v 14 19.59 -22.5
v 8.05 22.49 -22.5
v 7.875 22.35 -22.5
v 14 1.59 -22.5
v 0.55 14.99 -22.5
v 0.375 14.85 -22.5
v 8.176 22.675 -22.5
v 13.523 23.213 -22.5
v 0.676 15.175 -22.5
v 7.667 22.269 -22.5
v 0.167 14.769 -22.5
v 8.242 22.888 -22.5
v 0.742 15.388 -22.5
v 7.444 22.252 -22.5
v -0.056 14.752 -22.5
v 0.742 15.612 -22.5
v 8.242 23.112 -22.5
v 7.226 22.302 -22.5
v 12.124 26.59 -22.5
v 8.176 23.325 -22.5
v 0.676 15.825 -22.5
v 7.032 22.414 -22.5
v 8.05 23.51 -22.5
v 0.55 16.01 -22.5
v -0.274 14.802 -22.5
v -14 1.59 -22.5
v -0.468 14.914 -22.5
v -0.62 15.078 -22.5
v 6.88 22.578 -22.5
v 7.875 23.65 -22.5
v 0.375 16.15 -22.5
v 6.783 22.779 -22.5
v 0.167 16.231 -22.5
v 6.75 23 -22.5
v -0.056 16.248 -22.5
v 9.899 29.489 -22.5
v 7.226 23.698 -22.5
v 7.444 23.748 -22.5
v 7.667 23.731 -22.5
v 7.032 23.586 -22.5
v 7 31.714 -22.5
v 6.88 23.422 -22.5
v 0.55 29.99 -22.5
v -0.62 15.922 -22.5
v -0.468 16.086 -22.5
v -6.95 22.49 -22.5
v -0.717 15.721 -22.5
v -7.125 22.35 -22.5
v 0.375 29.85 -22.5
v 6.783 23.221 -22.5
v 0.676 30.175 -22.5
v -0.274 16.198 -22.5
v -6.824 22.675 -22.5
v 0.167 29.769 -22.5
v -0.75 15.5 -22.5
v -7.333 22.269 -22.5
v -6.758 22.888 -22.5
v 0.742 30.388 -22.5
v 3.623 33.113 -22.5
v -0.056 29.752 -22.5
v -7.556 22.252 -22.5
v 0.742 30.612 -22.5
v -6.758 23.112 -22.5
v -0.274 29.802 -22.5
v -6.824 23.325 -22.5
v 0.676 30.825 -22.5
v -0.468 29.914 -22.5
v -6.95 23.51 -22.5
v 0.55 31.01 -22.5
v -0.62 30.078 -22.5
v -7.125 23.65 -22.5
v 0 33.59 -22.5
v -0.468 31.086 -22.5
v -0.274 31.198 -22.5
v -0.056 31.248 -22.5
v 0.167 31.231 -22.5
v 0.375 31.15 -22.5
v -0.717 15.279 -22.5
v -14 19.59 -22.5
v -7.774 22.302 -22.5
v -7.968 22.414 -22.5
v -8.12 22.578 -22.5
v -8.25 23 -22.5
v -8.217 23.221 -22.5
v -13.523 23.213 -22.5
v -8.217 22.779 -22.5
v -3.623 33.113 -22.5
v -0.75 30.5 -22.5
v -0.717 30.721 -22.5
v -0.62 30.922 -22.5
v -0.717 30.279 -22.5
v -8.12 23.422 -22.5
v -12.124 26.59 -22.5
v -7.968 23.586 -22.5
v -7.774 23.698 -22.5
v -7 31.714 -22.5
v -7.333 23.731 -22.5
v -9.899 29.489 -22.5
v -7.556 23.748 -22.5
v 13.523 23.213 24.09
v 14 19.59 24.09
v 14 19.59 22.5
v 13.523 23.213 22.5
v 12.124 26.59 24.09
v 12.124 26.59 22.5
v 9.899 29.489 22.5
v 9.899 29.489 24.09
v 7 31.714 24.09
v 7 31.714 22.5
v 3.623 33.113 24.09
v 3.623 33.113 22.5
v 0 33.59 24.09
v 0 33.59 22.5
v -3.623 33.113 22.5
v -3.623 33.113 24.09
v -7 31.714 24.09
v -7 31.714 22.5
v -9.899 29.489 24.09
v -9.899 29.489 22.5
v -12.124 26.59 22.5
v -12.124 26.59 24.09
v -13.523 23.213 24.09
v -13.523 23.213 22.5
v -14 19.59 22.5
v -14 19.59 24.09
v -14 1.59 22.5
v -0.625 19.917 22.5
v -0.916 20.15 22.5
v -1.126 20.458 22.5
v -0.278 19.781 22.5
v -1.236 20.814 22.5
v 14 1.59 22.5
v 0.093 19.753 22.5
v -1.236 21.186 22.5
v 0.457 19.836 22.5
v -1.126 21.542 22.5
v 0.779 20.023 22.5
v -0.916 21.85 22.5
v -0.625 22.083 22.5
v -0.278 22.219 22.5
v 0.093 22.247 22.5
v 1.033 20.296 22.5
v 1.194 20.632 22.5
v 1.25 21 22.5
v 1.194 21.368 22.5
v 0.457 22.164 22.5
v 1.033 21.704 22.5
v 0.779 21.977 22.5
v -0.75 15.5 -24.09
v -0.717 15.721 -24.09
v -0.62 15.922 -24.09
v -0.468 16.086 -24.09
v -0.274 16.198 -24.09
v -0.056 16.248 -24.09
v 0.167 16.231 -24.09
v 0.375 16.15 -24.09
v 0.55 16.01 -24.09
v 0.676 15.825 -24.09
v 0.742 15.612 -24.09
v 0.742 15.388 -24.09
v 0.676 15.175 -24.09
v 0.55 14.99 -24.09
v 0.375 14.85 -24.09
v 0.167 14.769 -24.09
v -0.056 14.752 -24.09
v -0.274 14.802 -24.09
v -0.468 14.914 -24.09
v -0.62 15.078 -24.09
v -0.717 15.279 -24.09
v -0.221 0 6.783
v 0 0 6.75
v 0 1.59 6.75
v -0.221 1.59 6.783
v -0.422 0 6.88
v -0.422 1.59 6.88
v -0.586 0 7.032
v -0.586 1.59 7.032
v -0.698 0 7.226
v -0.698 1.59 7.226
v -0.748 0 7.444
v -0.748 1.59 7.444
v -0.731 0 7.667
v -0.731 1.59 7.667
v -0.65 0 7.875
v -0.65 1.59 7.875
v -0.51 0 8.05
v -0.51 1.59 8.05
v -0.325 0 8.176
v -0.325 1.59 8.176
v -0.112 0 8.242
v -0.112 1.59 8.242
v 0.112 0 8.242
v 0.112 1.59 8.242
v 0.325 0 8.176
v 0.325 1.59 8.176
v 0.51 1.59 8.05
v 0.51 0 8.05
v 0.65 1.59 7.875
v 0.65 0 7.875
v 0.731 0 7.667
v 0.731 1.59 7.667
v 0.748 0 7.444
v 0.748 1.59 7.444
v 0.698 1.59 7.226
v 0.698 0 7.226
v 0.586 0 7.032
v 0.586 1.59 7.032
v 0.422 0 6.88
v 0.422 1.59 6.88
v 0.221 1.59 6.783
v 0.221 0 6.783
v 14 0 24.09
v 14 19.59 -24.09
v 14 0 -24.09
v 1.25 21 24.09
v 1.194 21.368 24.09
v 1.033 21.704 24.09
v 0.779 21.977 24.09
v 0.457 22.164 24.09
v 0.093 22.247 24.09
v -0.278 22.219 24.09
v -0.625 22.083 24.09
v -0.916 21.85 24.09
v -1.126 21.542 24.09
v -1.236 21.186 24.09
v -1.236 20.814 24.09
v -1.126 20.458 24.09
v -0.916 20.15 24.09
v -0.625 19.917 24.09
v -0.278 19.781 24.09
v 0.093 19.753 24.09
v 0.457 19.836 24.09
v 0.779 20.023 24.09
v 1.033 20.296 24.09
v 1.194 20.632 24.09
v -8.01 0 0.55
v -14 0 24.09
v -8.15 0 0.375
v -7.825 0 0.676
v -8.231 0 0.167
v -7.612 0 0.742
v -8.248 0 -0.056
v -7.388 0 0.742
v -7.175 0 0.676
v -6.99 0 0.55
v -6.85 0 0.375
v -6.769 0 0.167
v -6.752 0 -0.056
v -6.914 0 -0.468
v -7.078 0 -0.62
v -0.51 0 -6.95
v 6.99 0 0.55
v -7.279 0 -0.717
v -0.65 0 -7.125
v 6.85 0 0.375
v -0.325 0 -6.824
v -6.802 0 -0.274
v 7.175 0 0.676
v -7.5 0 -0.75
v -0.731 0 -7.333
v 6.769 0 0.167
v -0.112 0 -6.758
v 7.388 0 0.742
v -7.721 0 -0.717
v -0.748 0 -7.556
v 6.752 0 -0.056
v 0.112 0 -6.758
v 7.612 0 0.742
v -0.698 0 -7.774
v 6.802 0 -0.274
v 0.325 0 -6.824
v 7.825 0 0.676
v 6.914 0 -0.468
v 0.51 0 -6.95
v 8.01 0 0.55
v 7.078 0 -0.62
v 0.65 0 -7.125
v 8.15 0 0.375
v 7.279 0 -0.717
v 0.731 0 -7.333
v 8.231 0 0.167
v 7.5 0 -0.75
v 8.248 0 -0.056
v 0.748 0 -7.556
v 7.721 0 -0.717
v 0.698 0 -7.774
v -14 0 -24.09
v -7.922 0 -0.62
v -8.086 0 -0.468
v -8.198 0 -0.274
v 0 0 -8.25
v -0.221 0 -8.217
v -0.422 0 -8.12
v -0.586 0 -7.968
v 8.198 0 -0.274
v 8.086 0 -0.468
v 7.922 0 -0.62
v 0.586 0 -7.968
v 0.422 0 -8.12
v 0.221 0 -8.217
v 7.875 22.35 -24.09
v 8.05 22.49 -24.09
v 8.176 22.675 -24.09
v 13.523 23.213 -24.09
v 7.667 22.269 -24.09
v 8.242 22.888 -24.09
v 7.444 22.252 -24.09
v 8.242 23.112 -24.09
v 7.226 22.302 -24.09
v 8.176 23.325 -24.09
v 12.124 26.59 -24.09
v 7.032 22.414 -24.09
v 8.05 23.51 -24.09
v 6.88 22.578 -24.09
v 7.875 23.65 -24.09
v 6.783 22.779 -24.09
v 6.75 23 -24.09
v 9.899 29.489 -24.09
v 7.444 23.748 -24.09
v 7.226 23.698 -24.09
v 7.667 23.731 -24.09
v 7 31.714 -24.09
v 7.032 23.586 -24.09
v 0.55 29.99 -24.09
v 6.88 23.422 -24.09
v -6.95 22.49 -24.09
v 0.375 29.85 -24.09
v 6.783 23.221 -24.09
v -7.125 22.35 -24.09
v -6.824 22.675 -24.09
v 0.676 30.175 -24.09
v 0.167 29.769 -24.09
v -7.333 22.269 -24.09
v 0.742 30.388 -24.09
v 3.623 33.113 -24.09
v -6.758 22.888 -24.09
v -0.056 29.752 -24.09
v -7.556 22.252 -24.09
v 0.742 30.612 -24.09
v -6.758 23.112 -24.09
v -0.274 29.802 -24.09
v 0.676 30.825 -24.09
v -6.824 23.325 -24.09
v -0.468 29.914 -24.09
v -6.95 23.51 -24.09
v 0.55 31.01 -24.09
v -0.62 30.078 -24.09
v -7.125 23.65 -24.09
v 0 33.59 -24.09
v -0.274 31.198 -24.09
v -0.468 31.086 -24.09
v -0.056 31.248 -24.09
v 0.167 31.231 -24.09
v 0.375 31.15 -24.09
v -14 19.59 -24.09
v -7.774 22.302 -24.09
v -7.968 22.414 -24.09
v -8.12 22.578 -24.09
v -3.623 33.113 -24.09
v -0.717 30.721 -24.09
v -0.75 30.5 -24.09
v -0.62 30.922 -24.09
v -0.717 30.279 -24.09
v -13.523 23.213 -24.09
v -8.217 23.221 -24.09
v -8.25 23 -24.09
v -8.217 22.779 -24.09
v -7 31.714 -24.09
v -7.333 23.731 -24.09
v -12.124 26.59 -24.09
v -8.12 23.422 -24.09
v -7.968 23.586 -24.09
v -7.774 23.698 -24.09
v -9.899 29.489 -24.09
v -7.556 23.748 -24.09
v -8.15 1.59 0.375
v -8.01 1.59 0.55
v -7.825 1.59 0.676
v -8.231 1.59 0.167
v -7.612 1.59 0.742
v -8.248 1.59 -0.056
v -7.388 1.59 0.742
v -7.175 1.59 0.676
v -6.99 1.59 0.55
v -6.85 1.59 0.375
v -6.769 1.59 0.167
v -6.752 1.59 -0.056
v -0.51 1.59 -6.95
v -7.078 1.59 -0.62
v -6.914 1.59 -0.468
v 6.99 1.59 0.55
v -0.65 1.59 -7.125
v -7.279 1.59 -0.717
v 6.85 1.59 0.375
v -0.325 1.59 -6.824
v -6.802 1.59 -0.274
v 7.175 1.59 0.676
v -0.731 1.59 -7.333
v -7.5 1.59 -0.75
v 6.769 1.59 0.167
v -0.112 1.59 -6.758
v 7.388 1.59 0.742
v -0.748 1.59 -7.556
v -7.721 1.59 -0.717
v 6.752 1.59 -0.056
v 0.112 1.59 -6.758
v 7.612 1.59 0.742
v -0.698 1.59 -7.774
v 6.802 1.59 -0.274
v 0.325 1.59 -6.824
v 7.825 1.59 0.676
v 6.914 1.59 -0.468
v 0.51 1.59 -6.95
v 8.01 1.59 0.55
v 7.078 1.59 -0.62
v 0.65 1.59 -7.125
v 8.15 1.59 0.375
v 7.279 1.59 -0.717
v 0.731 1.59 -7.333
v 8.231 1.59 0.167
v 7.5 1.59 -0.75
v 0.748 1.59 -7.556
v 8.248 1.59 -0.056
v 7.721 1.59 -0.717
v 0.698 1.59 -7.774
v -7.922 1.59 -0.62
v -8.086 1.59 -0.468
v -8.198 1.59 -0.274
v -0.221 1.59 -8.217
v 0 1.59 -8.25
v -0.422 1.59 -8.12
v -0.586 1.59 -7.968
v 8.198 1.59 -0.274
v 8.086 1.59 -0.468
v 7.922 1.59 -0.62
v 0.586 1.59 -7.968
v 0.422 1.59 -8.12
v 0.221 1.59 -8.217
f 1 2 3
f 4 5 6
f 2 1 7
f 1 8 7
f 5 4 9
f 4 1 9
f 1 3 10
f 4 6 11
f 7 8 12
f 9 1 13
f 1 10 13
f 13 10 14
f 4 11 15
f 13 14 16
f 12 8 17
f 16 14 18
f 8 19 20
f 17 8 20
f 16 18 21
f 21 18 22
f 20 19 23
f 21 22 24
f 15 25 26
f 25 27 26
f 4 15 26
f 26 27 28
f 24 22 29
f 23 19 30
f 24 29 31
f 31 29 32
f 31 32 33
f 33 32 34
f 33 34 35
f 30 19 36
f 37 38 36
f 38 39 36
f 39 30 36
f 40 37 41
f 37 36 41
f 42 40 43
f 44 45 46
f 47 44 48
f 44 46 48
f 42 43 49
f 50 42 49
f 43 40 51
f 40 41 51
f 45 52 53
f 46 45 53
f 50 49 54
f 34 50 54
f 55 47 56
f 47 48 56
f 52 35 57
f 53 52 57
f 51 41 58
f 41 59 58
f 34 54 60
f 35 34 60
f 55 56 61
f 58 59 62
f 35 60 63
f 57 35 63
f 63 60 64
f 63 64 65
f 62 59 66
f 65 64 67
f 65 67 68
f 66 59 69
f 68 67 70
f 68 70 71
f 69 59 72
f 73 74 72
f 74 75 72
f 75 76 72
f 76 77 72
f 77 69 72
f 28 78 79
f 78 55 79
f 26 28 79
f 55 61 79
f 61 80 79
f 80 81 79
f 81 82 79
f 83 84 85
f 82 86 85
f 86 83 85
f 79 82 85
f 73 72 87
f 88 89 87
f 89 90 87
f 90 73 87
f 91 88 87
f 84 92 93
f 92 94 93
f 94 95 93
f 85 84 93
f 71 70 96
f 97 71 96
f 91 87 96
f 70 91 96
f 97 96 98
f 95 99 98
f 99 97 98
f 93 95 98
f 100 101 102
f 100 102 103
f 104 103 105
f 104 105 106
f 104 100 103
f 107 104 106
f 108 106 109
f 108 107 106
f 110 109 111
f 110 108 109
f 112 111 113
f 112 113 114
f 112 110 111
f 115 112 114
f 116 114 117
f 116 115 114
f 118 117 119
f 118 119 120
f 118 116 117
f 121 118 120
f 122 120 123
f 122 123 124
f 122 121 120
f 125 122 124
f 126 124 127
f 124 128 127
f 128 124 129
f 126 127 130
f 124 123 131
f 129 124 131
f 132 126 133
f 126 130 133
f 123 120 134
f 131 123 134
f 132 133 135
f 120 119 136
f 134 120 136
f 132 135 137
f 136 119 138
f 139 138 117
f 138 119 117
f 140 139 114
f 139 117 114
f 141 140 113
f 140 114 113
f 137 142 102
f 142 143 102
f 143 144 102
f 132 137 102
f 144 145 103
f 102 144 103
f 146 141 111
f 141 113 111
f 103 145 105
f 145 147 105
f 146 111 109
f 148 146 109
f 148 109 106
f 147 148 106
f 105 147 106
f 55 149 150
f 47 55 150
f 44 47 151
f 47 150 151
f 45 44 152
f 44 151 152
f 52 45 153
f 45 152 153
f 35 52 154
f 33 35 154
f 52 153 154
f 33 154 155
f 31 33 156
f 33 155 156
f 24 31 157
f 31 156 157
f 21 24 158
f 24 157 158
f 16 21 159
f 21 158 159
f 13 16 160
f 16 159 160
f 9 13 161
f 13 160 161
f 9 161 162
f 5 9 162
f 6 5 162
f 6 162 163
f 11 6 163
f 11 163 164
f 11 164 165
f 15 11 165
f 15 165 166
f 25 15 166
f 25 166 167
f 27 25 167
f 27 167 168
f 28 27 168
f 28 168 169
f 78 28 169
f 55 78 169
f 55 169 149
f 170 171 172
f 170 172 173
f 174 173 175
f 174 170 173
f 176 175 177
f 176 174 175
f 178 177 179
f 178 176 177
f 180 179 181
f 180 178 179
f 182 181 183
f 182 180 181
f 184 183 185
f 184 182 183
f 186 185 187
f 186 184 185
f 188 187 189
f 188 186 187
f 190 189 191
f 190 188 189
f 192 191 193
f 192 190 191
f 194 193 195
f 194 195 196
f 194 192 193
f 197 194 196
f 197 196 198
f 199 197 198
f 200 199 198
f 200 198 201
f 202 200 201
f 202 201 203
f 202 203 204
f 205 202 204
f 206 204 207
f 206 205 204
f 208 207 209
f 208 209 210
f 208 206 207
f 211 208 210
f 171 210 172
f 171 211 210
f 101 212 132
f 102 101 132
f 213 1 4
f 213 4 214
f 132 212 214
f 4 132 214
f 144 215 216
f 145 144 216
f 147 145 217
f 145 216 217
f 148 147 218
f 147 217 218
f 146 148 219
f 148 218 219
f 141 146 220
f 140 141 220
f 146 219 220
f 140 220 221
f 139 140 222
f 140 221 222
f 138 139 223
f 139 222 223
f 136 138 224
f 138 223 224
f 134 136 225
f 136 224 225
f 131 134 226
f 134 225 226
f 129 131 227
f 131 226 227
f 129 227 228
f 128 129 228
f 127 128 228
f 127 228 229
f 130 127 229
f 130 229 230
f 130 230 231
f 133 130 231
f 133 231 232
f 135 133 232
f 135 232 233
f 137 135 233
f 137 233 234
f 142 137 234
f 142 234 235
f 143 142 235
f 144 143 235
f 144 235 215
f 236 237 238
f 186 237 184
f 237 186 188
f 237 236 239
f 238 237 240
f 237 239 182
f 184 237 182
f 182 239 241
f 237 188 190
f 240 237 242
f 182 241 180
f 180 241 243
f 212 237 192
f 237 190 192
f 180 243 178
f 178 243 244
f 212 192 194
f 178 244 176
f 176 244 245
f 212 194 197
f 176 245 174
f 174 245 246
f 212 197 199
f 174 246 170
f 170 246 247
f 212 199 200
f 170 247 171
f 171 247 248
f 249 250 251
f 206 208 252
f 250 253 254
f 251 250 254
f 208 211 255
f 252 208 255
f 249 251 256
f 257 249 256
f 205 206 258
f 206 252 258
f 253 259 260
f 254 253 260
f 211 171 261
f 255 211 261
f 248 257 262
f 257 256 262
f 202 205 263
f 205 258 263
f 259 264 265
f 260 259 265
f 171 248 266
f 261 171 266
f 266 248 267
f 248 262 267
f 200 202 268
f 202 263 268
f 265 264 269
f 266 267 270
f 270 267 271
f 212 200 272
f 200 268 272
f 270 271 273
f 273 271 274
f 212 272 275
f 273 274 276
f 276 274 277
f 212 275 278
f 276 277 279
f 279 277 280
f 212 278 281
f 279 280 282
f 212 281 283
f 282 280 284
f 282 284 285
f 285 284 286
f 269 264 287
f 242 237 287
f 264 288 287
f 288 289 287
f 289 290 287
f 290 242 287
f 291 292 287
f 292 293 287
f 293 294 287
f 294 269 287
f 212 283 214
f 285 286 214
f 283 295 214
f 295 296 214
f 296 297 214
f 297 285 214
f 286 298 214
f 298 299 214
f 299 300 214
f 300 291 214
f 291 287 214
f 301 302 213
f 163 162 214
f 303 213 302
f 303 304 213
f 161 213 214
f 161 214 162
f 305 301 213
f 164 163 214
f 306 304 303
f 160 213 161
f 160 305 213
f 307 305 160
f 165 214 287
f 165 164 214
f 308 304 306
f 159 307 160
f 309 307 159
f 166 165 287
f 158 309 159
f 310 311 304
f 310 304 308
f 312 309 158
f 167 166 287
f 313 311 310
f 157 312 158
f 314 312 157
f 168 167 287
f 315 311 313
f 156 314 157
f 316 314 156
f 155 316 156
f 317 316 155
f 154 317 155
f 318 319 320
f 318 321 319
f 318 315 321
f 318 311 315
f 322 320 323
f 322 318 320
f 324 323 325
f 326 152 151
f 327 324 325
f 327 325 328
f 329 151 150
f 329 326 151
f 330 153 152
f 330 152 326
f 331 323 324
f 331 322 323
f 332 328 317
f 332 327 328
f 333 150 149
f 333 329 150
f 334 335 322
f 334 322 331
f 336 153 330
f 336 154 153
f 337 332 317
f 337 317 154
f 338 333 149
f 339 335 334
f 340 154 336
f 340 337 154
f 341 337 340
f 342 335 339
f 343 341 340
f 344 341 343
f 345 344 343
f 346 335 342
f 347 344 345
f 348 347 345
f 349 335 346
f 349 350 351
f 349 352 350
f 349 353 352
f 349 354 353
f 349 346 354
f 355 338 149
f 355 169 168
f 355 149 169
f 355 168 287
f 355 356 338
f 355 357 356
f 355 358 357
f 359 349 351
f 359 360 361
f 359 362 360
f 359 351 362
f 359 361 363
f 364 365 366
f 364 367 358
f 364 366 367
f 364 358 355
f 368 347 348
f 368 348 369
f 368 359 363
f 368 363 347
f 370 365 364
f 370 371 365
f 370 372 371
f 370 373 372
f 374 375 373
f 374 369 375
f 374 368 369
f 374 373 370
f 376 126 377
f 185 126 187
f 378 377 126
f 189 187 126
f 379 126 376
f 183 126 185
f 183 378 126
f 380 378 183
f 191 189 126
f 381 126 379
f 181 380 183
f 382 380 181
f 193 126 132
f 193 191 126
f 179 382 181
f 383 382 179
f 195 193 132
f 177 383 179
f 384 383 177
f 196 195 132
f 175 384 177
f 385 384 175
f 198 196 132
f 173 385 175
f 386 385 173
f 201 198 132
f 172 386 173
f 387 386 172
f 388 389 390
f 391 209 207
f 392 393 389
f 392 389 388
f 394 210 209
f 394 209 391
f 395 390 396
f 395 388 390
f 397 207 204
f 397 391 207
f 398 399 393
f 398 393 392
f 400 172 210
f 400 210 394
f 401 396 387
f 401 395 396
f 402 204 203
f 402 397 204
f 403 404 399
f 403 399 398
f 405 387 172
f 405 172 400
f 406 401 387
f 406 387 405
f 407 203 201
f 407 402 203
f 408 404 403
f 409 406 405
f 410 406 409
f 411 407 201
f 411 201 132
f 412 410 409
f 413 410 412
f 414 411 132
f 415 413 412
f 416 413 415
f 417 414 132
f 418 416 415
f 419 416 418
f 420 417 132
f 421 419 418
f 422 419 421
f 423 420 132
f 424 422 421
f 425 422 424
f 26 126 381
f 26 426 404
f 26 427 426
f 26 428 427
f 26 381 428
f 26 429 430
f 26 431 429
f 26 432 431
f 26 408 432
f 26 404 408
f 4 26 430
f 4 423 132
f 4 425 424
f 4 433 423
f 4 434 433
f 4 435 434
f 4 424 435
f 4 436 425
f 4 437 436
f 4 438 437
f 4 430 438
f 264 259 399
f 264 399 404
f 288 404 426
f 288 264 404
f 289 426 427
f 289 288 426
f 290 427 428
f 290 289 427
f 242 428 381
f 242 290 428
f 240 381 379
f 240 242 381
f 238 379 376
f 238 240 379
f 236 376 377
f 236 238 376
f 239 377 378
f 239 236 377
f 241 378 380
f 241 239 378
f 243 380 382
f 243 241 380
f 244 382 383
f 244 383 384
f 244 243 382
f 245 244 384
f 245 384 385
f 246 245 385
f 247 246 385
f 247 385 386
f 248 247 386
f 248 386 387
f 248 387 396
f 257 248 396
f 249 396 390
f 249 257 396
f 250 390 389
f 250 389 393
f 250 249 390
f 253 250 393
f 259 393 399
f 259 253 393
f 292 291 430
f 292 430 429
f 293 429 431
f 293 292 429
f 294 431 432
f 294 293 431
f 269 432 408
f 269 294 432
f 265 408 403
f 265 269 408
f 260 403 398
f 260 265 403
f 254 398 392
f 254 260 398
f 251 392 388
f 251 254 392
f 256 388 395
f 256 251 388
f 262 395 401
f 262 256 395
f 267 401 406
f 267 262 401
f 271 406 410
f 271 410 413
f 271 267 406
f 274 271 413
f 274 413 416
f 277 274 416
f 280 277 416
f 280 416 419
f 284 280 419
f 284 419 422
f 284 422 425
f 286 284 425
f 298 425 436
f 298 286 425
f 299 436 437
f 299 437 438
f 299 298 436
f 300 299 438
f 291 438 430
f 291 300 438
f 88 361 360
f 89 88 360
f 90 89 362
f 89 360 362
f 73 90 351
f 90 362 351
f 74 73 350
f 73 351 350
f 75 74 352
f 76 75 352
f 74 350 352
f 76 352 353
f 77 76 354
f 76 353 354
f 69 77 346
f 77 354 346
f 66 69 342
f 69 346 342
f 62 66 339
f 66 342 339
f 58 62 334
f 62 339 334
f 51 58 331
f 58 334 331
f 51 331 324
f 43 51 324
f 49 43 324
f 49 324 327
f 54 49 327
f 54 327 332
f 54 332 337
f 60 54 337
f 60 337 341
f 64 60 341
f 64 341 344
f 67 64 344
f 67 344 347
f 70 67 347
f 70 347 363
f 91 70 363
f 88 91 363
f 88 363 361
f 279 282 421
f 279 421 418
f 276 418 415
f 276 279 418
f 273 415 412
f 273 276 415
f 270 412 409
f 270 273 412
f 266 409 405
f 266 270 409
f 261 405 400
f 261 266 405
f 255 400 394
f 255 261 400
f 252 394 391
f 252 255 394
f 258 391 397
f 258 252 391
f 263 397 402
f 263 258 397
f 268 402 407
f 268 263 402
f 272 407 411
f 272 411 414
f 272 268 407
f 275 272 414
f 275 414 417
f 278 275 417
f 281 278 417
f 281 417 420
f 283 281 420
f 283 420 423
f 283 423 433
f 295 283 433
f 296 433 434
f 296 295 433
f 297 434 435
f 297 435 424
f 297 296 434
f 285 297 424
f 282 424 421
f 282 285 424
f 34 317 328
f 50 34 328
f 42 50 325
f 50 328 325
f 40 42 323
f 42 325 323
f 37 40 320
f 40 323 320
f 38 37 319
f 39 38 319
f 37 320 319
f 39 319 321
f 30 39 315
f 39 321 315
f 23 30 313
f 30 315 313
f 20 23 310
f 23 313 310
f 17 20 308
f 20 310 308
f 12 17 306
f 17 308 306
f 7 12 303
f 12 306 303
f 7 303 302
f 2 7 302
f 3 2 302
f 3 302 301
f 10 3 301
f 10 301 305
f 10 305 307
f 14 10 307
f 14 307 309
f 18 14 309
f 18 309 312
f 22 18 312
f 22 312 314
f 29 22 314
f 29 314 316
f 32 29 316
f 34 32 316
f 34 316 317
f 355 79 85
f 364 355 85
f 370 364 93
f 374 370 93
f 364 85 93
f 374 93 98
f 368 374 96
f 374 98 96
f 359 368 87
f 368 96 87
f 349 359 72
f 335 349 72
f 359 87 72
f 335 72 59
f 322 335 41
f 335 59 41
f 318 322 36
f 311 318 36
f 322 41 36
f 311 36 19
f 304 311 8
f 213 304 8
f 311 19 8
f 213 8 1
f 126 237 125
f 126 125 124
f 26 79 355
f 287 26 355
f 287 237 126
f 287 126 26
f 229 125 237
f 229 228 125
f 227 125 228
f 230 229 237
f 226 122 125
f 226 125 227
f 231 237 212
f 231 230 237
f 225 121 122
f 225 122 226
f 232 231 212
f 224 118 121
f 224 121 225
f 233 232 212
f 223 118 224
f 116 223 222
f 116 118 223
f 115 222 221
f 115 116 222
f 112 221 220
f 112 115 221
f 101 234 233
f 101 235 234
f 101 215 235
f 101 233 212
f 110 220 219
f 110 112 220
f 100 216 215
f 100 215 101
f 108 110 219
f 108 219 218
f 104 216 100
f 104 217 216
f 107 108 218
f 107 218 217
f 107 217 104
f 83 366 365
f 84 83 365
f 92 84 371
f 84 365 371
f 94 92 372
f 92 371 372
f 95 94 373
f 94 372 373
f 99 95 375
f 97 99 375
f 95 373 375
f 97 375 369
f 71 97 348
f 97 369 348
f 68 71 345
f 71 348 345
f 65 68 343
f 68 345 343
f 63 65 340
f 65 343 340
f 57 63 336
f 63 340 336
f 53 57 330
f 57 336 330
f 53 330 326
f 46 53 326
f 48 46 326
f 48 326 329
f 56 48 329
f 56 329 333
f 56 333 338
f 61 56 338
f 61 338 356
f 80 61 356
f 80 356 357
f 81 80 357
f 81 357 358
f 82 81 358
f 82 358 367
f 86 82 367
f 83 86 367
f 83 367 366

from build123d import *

# Parameters (mm, degrees)
SKETCH1_W           = 28
SKETCH1_H           = 48.18
SKETCH1_R           = 0.75
BOSS_EXTRUDE1_DEPTH = 1.59
SKETCH2_W           = 28
SKETCH2_H           = 1.59
BOSS_EXTRUDE2_DEPTH = 18
BOSS_EXTRUDE3_DEPTH = 1.59
BOSS_EXTRUDE4_START = -1.59
BOSS_EXTRUDE4_DEPTH = 1.59
SKETCH5_R           = 1.25
CUT_EXTRUDE1_DEPTH  = 6
SKETCH6_R           = 0.75
CUT_EXTRUDE2_DEPTH  = 6


with BuildPart() as part:
    # Sketch1 → Boss-Extrude1 (new body)
    with BuildSketch(Plane(origin=(0, 0, 0), x_dir=(1, 0, 0), z_dir=(0, 1, 0))):
        Rectangle(SKETCH1_W, SKETCH1_H)
        with Locations(Location((0, 7.5, 0), (0, 0, 90))):
            Circle(SKETCH1_R, mode=Mode.SUBTRACT)
        with Locations(Location((0, -7.5, 0), (0, 0, 90))):
            Circle(SKETCH1_R, mode=Mode.SUBTRACT)
        with Locations(Location((7.5, 0, 0), (0, 0, 90))):
            Circle(SKETCH1_R, mode=Mode.SUBTRACT)
        with Locations(Location((-7.5, 0, 0), (0, 0, 90))):
            Circle(SKETCH1_R, mode=Mode.SUBTRACT)
    extrude(amount=BOSS_EXTRUDE1_DEPTH)

    # Sketch2 → Boss-Extrude2 (add)
    with BuildSketch(Plane(origin=(0, 1.59, 0), x_dir=(1, 0, 0), z_dir=(0, 1, 0))):
        with Locations((0, 23.295)):
            Rectangle(SKETCH2_W, SKETCH2_H)
        with Locations((0, -23.295)):
            Rectangle(SKETCH2_W, SKETCH2_H)
    extrude(amount=BOSS_EXTRUDE2_DEPTH)

    # Sketch3 → Boss-Extrude3 (add)
    with BuildSketch(Plane.XY.offset(24.09)):
        with BuildLine():
            Line((-14, 19.59), (14, 19.59))
            ThreePointArc((14, 19.59), (0, 33.59), (-14, 19.59))
        make_face()
    extrude(amount=-BOSS_EXTRUDE3_DEPTH)

    # Sketch4 → Boss-Extrude4 (add)
    with BuildSketch(Plane(origin=(0, 0, -24.09), x_dir=(-1, 0, 0), z_dir=(0, 0, -1)).offset(BOSS_EXTRUDE4_START)):
        with BuildLine():
            Line((-14, 19.59), (14, 19.59))
            ThreePointArc((14, 19.59), (0, 33.59), (-14, 19.59))
        make_face()
    extrude(amount=BOSS_EXTRUDE4_DEPTH)

    # Sketch5 → Cut-Extrude1 (cut)
    with BuildSketch(Plane.XY.offset(24.09)):
        with Locations((0, 21)):
            Circle(SKETCH5_R)
    extrude(amount=-CUT_EXTRUDE1_DEPTH, mode=Mode.SUBTRACT)

    # Sketch6 → Cut-Extrude2 (cut)
    with BuildSketch(Plane(origin=(0, 0, -24.09), x_dir=(-1, 0, 0), z_dir=(0, 0, -1))):
        with Locations((0, 30.5)):
            Circle(SKETCH6_R)
        with Locations((0, 15.5)):
            Circle(SKETCH6_R)
        with Locations((7.5, 23)):
            Circle(SKETCH6_R)
        with Locations((-7.5, 23)):
            Circle(SKETCH6_R)
    extrude(amount=-CUT_EXTRUDE2_DEPTH, mode=Mode.SUBTRACT)


solid = part.part
